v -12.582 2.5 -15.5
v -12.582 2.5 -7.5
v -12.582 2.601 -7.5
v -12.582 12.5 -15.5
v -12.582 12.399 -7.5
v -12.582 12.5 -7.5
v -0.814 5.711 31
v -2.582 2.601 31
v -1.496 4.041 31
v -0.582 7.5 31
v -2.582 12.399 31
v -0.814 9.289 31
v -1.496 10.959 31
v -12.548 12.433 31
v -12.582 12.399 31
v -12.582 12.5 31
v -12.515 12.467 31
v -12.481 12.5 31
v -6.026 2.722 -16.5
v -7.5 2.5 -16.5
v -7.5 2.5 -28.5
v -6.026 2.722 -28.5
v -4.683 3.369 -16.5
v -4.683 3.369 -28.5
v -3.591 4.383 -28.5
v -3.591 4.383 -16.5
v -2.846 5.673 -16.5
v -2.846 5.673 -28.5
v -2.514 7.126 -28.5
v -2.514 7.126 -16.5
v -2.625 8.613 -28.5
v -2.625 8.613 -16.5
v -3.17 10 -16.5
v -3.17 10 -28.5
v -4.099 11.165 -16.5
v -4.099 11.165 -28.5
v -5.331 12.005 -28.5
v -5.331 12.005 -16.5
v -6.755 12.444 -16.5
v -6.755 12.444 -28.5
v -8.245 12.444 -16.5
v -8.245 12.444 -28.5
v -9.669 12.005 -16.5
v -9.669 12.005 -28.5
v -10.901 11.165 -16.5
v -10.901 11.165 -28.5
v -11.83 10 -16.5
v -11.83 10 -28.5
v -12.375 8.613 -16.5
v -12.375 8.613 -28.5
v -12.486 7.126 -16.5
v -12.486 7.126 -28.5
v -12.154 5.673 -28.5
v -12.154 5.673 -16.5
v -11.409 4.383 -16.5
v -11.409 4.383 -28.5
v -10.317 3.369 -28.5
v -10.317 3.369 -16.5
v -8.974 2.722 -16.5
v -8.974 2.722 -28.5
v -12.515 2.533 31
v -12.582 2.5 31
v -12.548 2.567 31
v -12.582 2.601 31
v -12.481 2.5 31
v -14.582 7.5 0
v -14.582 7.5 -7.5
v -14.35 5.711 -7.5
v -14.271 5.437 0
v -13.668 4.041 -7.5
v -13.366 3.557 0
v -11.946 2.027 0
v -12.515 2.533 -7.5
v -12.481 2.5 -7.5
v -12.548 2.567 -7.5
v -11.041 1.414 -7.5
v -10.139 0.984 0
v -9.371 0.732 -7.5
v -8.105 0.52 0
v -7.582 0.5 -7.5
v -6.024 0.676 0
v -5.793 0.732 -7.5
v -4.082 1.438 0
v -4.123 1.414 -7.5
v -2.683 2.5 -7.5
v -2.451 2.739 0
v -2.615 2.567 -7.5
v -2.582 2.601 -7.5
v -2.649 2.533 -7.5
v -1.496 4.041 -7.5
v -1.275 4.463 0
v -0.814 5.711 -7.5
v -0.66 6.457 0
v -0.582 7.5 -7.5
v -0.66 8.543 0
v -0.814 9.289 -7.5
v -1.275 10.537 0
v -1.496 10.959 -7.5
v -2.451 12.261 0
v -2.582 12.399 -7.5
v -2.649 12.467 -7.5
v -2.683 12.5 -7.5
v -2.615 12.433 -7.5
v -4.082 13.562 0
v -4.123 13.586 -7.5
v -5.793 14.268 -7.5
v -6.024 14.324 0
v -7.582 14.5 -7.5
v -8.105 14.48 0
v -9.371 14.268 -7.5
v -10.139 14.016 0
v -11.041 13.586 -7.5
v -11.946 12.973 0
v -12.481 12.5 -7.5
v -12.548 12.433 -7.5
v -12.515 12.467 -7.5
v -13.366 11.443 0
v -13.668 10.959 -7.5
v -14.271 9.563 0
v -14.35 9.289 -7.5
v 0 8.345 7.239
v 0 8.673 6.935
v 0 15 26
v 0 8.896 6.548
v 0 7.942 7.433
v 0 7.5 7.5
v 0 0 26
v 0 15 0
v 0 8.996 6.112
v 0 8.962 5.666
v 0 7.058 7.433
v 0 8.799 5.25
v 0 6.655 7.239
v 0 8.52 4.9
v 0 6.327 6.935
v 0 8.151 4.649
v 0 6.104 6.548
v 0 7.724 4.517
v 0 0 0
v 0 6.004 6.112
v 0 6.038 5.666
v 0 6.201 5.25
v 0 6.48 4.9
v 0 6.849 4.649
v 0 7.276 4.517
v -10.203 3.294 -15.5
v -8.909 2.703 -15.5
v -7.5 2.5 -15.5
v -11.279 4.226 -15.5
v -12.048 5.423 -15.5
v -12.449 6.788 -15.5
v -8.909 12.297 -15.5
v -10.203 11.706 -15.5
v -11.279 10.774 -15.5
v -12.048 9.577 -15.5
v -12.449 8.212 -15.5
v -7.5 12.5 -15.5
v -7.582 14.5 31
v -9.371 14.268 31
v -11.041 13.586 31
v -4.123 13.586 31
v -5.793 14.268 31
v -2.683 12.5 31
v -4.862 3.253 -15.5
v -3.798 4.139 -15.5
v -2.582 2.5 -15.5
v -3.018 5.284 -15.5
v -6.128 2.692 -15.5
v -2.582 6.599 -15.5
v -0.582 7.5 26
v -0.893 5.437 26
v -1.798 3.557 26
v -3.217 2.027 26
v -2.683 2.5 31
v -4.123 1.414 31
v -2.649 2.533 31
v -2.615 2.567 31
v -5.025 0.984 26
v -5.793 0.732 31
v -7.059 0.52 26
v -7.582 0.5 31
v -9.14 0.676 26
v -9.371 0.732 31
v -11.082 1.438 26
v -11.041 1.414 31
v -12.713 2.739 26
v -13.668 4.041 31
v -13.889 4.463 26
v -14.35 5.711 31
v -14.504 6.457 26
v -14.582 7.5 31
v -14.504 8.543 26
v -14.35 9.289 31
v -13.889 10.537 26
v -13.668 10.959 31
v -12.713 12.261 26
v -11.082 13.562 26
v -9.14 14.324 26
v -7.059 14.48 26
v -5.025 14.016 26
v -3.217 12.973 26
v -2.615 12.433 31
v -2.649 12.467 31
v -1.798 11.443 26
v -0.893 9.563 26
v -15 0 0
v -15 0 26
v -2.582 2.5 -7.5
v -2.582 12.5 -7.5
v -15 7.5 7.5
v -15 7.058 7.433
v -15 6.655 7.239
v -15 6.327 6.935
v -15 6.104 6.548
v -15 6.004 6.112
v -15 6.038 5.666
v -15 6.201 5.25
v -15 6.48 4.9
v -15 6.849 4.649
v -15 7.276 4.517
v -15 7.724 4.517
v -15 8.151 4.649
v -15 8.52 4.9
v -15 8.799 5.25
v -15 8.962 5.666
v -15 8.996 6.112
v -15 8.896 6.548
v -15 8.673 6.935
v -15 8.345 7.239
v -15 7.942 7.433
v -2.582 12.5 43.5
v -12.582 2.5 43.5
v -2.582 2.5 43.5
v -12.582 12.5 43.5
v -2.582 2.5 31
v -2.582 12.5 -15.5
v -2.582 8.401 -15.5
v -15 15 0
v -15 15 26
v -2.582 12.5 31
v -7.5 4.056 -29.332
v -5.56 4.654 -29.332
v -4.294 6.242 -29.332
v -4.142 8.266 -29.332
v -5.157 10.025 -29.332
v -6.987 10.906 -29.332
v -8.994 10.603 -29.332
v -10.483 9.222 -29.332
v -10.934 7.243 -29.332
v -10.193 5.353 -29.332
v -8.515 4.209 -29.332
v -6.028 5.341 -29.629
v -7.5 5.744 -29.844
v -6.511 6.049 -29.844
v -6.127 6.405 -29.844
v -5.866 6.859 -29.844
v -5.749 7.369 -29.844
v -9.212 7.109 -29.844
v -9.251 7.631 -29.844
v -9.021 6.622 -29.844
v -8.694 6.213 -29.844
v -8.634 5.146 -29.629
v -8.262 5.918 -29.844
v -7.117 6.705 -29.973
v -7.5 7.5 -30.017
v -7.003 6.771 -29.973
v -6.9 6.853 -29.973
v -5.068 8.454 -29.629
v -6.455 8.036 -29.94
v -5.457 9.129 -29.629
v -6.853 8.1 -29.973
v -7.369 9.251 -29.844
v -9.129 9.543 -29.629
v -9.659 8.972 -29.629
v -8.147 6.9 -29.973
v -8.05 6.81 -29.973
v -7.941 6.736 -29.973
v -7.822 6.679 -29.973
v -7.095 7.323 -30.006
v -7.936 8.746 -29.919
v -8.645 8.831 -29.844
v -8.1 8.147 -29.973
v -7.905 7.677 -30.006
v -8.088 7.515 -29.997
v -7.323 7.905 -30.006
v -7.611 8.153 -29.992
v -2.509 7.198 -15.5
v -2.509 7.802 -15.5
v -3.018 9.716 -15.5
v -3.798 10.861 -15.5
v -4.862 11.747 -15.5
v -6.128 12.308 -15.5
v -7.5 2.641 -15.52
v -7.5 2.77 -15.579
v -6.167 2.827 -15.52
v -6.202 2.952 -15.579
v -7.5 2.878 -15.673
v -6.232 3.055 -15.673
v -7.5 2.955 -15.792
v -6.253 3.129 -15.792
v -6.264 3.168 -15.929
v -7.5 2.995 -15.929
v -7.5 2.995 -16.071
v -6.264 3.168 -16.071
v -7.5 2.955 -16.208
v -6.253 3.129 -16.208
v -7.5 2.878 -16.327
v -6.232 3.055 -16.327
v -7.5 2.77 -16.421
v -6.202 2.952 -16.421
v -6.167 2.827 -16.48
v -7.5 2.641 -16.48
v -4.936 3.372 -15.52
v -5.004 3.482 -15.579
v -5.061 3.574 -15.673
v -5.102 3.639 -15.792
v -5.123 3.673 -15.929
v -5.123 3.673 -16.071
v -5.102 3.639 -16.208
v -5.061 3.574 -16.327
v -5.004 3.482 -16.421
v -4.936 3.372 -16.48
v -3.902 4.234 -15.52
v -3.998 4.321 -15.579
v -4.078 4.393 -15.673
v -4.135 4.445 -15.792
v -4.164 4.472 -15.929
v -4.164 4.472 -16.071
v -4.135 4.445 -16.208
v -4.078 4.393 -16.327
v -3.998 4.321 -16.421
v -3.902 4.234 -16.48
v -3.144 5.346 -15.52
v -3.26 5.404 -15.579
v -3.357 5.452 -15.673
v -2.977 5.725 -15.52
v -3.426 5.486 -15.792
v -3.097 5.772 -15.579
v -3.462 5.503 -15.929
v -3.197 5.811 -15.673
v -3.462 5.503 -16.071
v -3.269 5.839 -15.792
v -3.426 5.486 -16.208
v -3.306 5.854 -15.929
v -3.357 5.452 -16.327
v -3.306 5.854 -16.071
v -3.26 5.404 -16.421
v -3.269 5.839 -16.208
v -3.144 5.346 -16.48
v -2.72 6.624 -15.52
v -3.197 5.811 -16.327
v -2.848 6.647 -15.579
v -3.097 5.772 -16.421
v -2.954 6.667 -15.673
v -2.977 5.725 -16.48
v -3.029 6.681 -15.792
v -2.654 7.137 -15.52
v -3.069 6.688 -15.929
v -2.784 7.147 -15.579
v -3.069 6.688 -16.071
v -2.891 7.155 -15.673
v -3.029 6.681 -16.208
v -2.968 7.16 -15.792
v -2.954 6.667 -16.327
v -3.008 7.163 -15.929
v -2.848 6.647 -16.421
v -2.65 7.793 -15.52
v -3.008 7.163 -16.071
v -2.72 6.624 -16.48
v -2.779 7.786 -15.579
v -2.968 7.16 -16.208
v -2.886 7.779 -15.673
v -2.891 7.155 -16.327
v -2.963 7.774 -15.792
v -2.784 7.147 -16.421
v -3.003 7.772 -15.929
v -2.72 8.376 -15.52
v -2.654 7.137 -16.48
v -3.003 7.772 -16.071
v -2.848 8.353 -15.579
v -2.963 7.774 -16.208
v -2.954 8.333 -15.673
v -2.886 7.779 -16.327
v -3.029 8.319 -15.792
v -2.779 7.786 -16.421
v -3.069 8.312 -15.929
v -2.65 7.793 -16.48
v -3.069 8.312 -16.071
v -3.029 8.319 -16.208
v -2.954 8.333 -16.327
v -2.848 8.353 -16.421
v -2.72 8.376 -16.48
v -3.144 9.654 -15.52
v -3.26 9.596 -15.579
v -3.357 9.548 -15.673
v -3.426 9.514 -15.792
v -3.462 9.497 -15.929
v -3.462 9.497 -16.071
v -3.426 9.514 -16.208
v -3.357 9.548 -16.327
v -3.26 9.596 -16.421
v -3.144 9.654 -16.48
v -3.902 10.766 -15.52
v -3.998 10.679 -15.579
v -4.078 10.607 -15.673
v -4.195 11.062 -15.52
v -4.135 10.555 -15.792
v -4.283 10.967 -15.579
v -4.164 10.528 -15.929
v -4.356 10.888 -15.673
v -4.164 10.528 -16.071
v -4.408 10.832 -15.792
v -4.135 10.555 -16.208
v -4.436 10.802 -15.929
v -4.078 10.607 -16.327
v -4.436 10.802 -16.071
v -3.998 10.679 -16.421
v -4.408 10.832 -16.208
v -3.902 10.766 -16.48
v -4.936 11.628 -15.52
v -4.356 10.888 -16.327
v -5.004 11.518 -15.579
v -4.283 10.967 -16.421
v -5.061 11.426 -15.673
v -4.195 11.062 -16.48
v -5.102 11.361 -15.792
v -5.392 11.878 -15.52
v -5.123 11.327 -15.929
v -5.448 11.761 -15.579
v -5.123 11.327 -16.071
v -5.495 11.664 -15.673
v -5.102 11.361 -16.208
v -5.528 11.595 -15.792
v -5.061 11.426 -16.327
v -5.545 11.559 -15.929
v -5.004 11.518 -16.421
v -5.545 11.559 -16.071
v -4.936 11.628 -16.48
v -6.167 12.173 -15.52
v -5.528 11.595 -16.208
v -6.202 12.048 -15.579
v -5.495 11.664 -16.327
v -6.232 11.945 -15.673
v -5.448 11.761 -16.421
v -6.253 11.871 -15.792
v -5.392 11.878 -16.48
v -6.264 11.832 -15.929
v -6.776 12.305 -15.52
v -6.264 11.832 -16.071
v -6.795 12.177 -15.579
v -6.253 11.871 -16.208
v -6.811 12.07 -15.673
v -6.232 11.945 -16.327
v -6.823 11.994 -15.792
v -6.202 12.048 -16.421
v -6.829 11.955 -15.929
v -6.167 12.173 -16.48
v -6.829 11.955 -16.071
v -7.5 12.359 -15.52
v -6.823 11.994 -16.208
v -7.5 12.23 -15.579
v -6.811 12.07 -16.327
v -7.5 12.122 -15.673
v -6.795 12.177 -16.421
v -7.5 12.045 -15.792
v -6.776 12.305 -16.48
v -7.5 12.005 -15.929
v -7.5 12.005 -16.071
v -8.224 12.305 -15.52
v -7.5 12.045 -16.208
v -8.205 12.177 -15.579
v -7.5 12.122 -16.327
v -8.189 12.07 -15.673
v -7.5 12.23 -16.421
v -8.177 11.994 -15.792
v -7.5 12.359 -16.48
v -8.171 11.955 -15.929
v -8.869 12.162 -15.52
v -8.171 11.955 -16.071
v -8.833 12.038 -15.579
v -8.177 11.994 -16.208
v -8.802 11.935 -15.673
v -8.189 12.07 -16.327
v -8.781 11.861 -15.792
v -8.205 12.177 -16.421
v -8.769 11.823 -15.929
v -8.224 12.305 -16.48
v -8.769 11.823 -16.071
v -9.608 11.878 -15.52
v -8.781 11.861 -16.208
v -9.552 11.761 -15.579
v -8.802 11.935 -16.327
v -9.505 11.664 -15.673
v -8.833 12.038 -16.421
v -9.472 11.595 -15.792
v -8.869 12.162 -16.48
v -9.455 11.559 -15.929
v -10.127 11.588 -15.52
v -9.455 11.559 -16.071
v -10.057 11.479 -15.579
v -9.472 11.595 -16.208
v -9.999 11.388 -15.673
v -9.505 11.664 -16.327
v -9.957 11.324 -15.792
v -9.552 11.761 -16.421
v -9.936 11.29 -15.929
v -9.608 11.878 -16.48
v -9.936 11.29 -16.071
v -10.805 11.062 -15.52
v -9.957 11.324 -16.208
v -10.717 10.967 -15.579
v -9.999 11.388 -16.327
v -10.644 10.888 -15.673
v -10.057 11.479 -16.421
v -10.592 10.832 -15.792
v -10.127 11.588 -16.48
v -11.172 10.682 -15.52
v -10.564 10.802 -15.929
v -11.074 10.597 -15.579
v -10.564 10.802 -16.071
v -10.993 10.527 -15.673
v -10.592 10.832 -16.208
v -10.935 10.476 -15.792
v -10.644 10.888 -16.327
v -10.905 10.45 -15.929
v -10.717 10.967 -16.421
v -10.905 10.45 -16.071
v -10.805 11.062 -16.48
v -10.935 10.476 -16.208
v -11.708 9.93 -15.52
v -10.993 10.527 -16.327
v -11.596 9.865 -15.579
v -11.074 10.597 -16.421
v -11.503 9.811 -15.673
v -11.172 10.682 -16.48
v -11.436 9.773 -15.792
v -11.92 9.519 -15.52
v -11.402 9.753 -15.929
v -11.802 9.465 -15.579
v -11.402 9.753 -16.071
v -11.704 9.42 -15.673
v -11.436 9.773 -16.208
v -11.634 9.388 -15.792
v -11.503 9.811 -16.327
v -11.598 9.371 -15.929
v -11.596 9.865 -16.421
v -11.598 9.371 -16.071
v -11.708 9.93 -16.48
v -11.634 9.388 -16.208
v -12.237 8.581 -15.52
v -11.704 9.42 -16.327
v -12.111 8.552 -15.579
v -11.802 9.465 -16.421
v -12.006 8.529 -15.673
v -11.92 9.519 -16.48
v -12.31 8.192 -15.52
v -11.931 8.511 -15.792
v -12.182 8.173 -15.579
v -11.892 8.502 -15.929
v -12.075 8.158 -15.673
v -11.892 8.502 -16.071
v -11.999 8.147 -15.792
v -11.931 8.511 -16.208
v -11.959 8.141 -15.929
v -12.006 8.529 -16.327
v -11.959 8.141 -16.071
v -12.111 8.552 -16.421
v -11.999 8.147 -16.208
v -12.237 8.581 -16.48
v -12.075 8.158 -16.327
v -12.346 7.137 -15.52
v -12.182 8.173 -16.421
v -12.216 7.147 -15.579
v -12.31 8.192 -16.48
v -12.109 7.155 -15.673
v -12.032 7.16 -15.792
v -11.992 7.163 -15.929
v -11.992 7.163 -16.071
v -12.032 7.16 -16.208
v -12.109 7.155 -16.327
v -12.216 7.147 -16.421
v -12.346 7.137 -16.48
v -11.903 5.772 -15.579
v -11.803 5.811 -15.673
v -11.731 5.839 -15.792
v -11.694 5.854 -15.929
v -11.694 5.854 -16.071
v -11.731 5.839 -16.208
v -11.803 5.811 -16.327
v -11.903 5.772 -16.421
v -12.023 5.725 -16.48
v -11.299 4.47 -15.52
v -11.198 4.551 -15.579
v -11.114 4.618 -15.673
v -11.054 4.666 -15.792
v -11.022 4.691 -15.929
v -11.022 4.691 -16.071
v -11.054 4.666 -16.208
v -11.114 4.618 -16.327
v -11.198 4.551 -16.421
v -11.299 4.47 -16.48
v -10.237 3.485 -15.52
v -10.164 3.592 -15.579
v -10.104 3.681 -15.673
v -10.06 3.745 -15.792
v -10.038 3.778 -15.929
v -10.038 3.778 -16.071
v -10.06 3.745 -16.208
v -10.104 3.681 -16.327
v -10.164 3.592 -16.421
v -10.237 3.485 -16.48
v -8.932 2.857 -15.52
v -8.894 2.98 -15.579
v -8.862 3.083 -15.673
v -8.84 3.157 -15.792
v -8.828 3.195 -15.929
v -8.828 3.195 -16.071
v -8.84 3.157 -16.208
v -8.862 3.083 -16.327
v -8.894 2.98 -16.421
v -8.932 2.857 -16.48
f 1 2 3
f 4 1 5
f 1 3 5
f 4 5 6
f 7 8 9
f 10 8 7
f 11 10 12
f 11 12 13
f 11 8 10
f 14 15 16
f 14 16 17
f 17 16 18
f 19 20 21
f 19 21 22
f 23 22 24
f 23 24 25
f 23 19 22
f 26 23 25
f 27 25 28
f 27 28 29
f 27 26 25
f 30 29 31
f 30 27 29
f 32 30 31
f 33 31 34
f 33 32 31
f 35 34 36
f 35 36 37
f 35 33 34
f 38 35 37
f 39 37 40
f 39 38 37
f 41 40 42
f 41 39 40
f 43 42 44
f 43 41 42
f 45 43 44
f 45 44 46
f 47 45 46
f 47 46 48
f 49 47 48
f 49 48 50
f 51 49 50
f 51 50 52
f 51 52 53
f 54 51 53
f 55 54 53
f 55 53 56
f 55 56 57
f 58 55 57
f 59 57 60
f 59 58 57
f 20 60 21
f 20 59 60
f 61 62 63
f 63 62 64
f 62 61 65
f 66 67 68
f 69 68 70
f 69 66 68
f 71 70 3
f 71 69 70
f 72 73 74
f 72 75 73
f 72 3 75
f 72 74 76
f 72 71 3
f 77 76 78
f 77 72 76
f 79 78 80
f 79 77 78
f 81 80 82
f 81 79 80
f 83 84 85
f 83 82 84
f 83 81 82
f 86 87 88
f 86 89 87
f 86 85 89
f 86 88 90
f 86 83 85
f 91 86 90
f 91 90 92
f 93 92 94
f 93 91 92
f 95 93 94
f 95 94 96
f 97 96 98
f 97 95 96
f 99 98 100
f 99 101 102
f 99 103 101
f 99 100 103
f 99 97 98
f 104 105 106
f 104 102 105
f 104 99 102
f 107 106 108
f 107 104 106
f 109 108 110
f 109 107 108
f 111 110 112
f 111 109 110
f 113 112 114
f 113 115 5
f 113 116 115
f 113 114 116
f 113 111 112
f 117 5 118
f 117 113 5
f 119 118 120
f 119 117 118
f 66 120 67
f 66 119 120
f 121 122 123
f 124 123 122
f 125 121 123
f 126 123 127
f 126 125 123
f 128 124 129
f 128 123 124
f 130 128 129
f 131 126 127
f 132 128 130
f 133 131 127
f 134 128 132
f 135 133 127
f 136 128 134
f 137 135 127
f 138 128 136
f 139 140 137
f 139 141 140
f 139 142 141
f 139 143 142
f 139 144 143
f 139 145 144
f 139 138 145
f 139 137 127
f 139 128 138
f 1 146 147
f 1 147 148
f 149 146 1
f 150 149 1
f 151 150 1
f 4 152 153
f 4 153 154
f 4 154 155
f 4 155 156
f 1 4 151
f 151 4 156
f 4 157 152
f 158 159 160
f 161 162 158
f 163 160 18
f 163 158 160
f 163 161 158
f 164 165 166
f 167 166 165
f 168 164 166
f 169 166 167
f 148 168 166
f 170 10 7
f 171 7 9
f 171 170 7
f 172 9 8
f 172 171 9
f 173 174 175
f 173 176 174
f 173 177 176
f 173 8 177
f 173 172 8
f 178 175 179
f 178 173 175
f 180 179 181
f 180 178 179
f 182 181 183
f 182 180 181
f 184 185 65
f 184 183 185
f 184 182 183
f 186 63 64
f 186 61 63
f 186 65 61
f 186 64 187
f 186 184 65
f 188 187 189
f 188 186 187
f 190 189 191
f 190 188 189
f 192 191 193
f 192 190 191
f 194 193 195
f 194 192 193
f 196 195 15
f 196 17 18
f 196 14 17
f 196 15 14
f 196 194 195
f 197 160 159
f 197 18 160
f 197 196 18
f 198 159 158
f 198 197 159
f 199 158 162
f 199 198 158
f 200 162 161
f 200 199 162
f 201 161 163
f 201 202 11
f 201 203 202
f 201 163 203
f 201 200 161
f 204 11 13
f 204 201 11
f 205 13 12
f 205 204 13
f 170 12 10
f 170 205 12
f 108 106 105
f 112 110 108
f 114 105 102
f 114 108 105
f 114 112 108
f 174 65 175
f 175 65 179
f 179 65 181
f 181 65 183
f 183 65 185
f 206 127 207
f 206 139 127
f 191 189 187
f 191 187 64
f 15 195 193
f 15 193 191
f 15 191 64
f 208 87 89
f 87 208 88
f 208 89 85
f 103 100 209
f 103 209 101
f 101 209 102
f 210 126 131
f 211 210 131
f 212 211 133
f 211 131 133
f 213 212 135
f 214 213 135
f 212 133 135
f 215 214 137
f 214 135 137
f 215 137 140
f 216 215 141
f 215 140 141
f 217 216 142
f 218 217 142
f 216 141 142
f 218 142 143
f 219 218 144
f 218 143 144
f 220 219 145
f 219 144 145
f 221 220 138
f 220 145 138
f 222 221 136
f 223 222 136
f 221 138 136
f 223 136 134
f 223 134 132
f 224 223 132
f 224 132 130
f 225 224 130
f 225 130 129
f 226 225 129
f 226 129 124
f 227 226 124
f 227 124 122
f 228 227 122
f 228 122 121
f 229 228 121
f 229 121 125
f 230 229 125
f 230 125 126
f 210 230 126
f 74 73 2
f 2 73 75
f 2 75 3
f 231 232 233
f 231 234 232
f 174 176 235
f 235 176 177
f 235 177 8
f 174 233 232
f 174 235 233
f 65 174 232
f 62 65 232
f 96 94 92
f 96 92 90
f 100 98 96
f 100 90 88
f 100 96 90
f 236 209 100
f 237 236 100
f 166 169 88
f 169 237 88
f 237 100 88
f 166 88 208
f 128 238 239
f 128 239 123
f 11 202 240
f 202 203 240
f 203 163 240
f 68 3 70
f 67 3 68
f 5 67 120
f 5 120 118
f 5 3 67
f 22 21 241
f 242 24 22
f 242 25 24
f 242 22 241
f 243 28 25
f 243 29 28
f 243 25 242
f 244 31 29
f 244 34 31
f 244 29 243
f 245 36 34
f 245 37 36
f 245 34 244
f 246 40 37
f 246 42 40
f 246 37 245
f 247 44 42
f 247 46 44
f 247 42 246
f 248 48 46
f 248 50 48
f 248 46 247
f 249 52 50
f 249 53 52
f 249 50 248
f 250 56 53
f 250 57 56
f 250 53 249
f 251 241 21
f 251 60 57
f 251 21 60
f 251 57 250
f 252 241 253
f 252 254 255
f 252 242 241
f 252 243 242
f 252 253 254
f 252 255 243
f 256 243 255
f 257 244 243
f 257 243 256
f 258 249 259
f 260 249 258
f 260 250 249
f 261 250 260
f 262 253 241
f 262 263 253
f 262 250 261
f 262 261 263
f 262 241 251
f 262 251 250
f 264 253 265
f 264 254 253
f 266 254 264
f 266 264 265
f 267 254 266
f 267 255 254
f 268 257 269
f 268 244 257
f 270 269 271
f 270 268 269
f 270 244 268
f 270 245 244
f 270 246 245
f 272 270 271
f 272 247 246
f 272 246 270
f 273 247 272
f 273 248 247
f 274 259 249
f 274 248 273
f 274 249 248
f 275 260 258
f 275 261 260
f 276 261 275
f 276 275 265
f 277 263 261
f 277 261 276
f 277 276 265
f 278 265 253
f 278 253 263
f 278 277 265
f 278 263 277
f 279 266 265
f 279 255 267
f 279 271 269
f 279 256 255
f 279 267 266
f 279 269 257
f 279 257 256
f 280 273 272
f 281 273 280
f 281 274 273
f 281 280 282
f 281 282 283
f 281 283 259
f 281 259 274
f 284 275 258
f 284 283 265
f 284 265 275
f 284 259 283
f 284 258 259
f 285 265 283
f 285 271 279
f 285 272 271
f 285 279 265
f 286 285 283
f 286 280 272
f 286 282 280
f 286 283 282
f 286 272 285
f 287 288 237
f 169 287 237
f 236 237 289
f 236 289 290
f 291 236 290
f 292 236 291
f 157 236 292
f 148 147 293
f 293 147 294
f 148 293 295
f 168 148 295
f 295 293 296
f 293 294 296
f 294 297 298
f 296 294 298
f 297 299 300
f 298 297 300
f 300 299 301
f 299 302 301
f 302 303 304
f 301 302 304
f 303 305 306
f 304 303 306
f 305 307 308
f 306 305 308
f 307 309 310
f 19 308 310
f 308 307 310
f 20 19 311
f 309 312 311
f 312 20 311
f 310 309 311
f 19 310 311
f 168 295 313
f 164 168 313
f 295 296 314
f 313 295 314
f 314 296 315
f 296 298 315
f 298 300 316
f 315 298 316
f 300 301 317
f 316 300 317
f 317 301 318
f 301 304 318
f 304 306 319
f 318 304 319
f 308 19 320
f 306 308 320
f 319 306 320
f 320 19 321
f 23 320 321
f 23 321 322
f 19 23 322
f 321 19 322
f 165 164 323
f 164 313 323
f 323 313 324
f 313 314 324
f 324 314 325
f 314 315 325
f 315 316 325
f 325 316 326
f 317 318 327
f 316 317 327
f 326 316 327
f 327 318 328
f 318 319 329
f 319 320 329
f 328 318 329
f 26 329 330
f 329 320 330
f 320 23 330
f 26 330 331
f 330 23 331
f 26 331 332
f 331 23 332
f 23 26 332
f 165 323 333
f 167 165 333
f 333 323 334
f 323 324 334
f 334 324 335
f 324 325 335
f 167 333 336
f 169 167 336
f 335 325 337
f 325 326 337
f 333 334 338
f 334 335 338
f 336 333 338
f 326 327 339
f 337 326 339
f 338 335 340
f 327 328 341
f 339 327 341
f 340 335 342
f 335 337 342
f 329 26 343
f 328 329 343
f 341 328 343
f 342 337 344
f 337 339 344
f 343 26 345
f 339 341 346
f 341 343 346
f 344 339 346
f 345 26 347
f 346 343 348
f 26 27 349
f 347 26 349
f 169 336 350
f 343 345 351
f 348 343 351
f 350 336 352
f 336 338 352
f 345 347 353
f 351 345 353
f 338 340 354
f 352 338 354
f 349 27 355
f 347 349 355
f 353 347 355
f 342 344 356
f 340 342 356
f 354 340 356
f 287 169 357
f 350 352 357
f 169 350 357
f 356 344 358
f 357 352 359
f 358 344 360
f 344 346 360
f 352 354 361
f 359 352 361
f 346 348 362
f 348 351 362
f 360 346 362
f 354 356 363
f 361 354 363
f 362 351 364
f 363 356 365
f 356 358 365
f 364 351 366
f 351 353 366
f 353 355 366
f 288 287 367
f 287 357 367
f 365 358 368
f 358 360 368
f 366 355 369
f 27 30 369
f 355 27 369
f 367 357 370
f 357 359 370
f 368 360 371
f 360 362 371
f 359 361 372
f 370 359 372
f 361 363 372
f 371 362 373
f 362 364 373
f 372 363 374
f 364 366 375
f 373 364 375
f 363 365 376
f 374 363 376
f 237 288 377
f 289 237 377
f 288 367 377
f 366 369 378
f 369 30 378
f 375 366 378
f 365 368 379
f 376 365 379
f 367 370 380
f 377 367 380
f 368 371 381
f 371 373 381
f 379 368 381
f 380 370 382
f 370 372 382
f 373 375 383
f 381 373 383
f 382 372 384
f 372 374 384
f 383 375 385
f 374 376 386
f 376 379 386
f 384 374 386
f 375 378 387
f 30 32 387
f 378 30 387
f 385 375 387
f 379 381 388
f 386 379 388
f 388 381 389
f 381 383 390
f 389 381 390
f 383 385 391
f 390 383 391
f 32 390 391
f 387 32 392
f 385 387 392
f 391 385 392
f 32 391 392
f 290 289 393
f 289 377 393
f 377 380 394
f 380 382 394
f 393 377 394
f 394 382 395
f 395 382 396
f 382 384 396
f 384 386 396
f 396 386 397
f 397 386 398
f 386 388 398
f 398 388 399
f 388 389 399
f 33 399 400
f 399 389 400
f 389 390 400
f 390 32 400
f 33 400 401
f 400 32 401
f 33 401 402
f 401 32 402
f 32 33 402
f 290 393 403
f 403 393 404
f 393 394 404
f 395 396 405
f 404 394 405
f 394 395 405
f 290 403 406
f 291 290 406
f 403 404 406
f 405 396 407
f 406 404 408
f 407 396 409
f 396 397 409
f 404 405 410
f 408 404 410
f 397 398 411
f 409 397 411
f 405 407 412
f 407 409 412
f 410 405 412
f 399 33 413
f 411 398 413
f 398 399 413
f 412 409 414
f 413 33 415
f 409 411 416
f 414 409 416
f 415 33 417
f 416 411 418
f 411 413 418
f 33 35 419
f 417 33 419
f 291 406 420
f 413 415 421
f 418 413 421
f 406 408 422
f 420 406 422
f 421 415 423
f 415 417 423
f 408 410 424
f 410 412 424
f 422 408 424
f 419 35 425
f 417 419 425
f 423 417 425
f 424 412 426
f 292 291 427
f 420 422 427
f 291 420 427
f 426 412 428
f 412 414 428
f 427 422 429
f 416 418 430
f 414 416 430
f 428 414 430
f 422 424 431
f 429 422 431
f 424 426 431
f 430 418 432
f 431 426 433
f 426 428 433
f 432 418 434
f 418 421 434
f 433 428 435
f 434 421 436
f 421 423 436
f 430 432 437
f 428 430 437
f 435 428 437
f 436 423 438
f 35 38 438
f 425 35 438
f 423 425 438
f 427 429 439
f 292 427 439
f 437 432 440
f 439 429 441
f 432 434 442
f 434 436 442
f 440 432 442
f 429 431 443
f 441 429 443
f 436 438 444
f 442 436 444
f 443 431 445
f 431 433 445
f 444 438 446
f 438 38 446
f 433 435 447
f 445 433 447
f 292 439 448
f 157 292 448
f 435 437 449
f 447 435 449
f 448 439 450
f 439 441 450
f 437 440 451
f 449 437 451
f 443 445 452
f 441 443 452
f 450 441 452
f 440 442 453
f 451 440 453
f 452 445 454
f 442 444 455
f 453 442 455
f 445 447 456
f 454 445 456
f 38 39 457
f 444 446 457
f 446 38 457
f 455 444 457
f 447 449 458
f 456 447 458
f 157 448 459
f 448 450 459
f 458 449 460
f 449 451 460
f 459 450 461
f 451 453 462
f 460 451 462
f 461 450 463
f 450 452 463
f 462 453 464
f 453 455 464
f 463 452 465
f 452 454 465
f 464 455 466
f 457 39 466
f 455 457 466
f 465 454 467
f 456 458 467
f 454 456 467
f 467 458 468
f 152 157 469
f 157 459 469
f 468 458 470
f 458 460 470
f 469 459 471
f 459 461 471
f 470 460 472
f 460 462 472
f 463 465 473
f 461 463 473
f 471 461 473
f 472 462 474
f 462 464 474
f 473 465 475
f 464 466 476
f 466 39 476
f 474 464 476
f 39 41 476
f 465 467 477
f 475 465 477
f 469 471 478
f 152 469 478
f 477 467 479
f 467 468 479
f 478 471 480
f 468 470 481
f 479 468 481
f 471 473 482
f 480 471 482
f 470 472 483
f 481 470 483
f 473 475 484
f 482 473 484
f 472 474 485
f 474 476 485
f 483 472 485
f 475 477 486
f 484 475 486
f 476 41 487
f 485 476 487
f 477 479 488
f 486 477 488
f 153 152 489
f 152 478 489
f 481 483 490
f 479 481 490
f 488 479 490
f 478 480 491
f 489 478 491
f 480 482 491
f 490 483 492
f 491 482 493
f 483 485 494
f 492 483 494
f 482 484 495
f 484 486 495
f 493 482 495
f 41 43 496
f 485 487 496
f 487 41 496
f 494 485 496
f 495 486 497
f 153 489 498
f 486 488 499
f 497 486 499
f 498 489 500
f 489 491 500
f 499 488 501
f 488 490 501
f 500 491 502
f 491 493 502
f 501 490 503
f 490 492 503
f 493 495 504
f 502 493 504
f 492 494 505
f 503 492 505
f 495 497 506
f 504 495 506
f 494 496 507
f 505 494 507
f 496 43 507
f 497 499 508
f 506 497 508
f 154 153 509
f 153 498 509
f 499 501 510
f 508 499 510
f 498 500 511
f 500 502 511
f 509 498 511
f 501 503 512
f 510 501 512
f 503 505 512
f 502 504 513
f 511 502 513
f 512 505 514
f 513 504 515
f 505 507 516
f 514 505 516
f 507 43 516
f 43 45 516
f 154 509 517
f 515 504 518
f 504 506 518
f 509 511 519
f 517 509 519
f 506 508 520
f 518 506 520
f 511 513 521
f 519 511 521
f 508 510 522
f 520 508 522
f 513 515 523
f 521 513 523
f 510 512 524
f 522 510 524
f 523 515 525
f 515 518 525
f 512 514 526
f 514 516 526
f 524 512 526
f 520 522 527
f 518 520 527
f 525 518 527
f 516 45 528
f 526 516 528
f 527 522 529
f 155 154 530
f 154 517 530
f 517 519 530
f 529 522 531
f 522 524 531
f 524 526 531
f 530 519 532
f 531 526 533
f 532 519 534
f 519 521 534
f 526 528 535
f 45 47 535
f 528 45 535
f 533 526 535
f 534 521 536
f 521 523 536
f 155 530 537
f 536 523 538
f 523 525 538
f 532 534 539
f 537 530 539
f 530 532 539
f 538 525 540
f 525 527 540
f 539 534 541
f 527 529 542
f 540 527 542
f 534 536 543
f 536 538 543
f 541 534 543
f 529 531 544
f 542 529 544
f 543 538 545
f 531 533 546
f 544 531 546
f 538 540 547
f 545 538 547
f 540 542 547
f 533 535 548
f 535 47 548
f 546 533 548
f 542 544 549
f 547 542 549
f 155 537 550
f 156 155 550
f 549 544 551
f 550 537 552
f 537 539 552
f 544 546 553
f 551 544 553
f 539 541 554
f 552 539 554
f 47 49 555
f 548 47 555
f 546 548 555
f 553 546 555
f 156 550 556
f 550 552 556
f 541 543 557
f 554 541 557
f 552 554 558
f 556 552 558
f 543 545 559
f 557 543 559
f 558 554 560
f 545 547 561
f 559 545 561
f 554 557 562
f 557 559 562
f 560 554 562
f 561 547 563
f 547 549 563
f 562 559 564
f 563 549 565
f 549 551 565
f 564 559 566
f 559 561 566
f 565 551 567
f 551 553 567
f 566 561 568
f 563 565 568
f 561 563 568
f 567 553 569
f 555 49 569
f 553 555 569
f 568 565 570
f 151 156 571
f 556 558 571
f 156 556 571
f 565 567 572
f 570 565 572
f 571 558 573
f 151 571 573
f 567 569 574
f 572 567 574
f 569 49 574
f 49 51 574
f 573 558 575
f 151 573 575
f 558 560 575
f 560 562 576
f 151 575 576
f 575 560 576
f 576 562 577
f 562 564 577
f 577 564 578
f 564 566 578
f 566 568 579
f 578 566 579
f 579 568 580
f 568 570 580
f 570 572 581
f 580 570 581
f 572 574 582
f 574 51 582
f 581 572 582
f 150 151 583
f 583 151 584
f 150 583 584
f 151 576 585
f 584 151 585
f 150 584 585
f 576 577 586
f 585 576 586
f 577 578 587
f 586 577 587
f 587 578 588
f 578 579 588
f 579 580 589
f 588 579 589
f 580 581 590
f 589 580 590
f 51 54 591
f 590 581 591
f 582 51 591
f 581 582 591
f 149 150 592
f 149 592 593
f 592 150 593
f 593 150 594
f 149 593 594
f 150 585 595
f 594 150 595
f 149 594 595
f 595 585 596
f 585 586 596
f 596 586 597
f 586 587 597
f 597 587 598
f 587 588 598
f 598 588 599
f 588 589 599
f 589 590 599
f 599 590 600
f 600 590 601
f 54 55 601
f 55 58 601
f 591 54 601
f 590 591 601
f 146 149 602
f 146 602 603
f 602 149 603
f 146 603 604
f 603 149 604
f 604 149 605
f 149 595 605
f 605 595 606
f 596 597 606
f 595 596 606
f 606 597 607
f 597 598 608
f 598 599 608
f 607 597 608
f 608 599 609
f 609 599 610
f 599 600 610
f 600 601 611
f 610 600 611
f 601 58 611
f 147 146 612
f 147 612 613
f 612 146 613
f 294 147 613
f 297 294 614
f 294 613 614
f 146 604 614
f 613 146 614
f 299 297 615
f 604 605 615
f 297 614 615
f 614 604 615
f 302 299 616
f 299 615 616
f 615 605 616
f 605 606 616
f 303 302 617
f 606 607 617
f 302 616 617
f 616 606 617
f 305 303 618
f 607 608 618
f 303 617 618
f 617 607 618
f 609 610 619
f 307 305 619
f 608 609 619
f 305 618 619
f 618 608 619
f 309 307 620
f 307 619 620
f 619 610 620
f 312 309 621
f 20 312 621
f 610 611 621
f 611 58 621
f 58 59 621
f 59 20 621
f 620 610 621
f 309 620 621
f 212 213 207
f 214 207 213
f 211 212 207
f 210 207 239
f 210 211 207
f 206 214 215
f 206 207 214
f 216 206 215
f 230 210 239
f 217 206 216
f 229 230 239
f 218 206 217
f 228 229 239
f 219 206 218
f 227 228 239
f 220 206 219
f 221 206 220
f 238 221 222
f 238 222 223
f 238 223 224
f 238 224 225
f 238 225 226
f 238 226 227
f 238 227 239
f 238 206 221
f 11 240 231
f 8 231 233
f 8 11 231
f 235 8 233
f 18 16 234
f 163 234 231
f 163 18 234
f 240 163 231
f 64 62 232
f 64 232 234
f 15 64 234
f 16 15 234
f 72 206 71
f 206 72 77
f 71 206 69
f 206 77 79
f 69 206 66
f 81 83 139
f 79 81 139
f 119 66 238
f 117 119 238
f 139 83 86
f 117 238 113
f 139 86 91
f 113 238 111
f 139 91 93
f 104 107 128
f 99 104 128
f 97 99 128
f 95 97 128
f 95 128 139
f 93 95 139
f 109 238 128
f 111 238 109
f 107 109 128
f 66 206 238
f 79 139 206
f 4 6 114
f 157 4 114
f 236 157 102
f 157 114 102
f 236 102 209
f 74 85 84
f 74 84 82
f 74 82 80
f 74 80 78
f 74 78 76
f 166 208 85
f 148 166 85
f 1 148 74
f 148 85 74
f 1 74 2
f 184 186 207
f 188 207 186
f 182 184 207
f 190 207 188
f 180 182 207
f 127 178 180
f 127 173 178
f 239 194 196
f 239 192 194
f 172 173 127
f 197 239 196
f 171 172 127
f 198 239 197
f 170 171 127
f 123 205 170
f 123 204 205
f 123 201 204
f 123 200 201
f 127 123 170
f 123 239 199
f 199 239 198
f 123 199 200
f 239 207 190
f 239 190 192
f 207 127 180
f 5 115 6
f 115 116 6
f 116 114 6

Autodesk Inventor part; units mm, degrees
ref_plane "YZ Plane" through (0, 0, 0) normal (1, 0, 0) x (0, 1, 0)
ref_plane "XZ Plane" through (0, 0, 0) normal (0, 1, 0) x (-1, 0, 0)
sketch "Sketch1" plane through (0, 0, 0) normal (0, 0, 1) x (1, 0, 0)
  line L0 (0, 0) -> (-15, 0)
  line L1 (-15, 0) -> (-15, 15)
  line L2 (-15, 15) -> (0, 15)
  line L3 (0, 15) -> (0, 0)
  dimension "d0" = 15
  dimension "d1" = 15
extrude "Extrusion1" add sketch "Sketch1" along normal blind 26
sketch "Sketch2" plane through (0, 0, 26) normal (0, 0, 1) x (1, 0, 0)
  circle A0 centre (-7.5819, 7.5) radius 7
  point P0 (0, 0)
  dimension "d4" = 14
extrude "Extrusion2" add sketch "Sketch2" along normal blind 5
sketch "Sketch3" plane through (-7.5819, 7.5, 31) normal (0, 0, 1) x (1, 0, 0)
  line L0 (-5, 5) -> (5, 5)
  line L1 (5, 5) -> (5, -5)
  line L2 (5, -5) -> (-5, -5)
  line L3 (-5, -5) -> (-5, 5)
  line L4 (-5, 5) -> (5, -5) construction
  line L5 (5, 5) -> (-5, -5) construction
  point P0 (7.5819, -7.5)
  point P1 (0, 0)
  dimension "d7" = 10
  dimension "d8" = 10
extrude "Extrusion3" add sketch "Sketch3" along normal blind 12.5
sketch "Sketch4" plane through (0, 0, 0) normal (0, 0, -1) x (-1, 0, 0)
  circle A0 centre (7.5819, 7.5) radius 7 projected
  circle A1 centre (7.5819, 7.5) radius 7
  point P0 (0, 0)
  dimension "d11" = 14
extrude "Extrusion4" add sketch "Sketch4" along normal blind 7.5
sketch "Sketch5" plane through (-7.5819, 7.5, -7.5) normal (0, 0, -1) x (-1, 0, 0)
  line L0 (-5, -5) -> (5, -5)
  line L1 (5, -5) -> (5, 5)
  line L2 (5, 5) -> (-5, 5)
  line L3 (-5, 5) -> (-5, -5)
  line L4 (-5, -5) -> (5, 5) construction
  line L5 (5, -5) -> (-5, 5) construction
  point P0 (-7.5819, -7.5)
  point P1 (0, 0)
  dimension "d14" = 10
  dimension "d15" = 10
extrude "Extrusion5" add sketch "Sketch5" along normal blind 8
ref_plane "Work Plane1" through (-7.5, 0, 0) normal (-1, 0, 0) x (0, 0, 1)
sketch "Sketch6" plane through (-7.5, 0, 0) normal (-1, 0, 0) x (0, 0, 1)
  line L0 (-15.5, 12.5) -> (-15.5, 2.5) projected
  line L1 (-7.5, 2.5) -> (-15.5, 2.5) projected
  arc A0 (-15.5, 2.5) -> (-16.5, 2.5) centre (-16, 2.5) ccw
  line L2 (-28.5, 2.5) -> (-16.5, 2.5)
  arc A1 (-30.0167, 7.5) -> (-28.5, 2.5) centre (-21.0167, 7.5) ccw
  line L3 (-30.0167, 7.5) -> (-15.5, 7.5)
  line L4 (-15.5, 2.5) -> (-15.5, 7.5)
  point P0 (0, 0)
  dimension "d19" = 0.5
  dimension "d20" = 1
  dimension "d21" = 12
  dimension "d22" = 18
revolve "Revolution1" add sketch "Sketch6" angle 360 about axis through (-7.5, 7.5, -30.0167) along (0, 0, 1)
sketch "Sketch7" plane through (-15, 0, 0) normal (-1, 0, 0) x (0, 0, 1)
  line L0 (0, 15) -> (26, 15) projected
  line L1 (0, 15) -> (0, 0) projected
  point P0 (6, 7.5)
  dimension "d31" = 7.5
  dimension "d32" = 6
hole "Hole1" at (-15, 7.5, 6) direction (1, 0, 0) diameter 3 end through all
